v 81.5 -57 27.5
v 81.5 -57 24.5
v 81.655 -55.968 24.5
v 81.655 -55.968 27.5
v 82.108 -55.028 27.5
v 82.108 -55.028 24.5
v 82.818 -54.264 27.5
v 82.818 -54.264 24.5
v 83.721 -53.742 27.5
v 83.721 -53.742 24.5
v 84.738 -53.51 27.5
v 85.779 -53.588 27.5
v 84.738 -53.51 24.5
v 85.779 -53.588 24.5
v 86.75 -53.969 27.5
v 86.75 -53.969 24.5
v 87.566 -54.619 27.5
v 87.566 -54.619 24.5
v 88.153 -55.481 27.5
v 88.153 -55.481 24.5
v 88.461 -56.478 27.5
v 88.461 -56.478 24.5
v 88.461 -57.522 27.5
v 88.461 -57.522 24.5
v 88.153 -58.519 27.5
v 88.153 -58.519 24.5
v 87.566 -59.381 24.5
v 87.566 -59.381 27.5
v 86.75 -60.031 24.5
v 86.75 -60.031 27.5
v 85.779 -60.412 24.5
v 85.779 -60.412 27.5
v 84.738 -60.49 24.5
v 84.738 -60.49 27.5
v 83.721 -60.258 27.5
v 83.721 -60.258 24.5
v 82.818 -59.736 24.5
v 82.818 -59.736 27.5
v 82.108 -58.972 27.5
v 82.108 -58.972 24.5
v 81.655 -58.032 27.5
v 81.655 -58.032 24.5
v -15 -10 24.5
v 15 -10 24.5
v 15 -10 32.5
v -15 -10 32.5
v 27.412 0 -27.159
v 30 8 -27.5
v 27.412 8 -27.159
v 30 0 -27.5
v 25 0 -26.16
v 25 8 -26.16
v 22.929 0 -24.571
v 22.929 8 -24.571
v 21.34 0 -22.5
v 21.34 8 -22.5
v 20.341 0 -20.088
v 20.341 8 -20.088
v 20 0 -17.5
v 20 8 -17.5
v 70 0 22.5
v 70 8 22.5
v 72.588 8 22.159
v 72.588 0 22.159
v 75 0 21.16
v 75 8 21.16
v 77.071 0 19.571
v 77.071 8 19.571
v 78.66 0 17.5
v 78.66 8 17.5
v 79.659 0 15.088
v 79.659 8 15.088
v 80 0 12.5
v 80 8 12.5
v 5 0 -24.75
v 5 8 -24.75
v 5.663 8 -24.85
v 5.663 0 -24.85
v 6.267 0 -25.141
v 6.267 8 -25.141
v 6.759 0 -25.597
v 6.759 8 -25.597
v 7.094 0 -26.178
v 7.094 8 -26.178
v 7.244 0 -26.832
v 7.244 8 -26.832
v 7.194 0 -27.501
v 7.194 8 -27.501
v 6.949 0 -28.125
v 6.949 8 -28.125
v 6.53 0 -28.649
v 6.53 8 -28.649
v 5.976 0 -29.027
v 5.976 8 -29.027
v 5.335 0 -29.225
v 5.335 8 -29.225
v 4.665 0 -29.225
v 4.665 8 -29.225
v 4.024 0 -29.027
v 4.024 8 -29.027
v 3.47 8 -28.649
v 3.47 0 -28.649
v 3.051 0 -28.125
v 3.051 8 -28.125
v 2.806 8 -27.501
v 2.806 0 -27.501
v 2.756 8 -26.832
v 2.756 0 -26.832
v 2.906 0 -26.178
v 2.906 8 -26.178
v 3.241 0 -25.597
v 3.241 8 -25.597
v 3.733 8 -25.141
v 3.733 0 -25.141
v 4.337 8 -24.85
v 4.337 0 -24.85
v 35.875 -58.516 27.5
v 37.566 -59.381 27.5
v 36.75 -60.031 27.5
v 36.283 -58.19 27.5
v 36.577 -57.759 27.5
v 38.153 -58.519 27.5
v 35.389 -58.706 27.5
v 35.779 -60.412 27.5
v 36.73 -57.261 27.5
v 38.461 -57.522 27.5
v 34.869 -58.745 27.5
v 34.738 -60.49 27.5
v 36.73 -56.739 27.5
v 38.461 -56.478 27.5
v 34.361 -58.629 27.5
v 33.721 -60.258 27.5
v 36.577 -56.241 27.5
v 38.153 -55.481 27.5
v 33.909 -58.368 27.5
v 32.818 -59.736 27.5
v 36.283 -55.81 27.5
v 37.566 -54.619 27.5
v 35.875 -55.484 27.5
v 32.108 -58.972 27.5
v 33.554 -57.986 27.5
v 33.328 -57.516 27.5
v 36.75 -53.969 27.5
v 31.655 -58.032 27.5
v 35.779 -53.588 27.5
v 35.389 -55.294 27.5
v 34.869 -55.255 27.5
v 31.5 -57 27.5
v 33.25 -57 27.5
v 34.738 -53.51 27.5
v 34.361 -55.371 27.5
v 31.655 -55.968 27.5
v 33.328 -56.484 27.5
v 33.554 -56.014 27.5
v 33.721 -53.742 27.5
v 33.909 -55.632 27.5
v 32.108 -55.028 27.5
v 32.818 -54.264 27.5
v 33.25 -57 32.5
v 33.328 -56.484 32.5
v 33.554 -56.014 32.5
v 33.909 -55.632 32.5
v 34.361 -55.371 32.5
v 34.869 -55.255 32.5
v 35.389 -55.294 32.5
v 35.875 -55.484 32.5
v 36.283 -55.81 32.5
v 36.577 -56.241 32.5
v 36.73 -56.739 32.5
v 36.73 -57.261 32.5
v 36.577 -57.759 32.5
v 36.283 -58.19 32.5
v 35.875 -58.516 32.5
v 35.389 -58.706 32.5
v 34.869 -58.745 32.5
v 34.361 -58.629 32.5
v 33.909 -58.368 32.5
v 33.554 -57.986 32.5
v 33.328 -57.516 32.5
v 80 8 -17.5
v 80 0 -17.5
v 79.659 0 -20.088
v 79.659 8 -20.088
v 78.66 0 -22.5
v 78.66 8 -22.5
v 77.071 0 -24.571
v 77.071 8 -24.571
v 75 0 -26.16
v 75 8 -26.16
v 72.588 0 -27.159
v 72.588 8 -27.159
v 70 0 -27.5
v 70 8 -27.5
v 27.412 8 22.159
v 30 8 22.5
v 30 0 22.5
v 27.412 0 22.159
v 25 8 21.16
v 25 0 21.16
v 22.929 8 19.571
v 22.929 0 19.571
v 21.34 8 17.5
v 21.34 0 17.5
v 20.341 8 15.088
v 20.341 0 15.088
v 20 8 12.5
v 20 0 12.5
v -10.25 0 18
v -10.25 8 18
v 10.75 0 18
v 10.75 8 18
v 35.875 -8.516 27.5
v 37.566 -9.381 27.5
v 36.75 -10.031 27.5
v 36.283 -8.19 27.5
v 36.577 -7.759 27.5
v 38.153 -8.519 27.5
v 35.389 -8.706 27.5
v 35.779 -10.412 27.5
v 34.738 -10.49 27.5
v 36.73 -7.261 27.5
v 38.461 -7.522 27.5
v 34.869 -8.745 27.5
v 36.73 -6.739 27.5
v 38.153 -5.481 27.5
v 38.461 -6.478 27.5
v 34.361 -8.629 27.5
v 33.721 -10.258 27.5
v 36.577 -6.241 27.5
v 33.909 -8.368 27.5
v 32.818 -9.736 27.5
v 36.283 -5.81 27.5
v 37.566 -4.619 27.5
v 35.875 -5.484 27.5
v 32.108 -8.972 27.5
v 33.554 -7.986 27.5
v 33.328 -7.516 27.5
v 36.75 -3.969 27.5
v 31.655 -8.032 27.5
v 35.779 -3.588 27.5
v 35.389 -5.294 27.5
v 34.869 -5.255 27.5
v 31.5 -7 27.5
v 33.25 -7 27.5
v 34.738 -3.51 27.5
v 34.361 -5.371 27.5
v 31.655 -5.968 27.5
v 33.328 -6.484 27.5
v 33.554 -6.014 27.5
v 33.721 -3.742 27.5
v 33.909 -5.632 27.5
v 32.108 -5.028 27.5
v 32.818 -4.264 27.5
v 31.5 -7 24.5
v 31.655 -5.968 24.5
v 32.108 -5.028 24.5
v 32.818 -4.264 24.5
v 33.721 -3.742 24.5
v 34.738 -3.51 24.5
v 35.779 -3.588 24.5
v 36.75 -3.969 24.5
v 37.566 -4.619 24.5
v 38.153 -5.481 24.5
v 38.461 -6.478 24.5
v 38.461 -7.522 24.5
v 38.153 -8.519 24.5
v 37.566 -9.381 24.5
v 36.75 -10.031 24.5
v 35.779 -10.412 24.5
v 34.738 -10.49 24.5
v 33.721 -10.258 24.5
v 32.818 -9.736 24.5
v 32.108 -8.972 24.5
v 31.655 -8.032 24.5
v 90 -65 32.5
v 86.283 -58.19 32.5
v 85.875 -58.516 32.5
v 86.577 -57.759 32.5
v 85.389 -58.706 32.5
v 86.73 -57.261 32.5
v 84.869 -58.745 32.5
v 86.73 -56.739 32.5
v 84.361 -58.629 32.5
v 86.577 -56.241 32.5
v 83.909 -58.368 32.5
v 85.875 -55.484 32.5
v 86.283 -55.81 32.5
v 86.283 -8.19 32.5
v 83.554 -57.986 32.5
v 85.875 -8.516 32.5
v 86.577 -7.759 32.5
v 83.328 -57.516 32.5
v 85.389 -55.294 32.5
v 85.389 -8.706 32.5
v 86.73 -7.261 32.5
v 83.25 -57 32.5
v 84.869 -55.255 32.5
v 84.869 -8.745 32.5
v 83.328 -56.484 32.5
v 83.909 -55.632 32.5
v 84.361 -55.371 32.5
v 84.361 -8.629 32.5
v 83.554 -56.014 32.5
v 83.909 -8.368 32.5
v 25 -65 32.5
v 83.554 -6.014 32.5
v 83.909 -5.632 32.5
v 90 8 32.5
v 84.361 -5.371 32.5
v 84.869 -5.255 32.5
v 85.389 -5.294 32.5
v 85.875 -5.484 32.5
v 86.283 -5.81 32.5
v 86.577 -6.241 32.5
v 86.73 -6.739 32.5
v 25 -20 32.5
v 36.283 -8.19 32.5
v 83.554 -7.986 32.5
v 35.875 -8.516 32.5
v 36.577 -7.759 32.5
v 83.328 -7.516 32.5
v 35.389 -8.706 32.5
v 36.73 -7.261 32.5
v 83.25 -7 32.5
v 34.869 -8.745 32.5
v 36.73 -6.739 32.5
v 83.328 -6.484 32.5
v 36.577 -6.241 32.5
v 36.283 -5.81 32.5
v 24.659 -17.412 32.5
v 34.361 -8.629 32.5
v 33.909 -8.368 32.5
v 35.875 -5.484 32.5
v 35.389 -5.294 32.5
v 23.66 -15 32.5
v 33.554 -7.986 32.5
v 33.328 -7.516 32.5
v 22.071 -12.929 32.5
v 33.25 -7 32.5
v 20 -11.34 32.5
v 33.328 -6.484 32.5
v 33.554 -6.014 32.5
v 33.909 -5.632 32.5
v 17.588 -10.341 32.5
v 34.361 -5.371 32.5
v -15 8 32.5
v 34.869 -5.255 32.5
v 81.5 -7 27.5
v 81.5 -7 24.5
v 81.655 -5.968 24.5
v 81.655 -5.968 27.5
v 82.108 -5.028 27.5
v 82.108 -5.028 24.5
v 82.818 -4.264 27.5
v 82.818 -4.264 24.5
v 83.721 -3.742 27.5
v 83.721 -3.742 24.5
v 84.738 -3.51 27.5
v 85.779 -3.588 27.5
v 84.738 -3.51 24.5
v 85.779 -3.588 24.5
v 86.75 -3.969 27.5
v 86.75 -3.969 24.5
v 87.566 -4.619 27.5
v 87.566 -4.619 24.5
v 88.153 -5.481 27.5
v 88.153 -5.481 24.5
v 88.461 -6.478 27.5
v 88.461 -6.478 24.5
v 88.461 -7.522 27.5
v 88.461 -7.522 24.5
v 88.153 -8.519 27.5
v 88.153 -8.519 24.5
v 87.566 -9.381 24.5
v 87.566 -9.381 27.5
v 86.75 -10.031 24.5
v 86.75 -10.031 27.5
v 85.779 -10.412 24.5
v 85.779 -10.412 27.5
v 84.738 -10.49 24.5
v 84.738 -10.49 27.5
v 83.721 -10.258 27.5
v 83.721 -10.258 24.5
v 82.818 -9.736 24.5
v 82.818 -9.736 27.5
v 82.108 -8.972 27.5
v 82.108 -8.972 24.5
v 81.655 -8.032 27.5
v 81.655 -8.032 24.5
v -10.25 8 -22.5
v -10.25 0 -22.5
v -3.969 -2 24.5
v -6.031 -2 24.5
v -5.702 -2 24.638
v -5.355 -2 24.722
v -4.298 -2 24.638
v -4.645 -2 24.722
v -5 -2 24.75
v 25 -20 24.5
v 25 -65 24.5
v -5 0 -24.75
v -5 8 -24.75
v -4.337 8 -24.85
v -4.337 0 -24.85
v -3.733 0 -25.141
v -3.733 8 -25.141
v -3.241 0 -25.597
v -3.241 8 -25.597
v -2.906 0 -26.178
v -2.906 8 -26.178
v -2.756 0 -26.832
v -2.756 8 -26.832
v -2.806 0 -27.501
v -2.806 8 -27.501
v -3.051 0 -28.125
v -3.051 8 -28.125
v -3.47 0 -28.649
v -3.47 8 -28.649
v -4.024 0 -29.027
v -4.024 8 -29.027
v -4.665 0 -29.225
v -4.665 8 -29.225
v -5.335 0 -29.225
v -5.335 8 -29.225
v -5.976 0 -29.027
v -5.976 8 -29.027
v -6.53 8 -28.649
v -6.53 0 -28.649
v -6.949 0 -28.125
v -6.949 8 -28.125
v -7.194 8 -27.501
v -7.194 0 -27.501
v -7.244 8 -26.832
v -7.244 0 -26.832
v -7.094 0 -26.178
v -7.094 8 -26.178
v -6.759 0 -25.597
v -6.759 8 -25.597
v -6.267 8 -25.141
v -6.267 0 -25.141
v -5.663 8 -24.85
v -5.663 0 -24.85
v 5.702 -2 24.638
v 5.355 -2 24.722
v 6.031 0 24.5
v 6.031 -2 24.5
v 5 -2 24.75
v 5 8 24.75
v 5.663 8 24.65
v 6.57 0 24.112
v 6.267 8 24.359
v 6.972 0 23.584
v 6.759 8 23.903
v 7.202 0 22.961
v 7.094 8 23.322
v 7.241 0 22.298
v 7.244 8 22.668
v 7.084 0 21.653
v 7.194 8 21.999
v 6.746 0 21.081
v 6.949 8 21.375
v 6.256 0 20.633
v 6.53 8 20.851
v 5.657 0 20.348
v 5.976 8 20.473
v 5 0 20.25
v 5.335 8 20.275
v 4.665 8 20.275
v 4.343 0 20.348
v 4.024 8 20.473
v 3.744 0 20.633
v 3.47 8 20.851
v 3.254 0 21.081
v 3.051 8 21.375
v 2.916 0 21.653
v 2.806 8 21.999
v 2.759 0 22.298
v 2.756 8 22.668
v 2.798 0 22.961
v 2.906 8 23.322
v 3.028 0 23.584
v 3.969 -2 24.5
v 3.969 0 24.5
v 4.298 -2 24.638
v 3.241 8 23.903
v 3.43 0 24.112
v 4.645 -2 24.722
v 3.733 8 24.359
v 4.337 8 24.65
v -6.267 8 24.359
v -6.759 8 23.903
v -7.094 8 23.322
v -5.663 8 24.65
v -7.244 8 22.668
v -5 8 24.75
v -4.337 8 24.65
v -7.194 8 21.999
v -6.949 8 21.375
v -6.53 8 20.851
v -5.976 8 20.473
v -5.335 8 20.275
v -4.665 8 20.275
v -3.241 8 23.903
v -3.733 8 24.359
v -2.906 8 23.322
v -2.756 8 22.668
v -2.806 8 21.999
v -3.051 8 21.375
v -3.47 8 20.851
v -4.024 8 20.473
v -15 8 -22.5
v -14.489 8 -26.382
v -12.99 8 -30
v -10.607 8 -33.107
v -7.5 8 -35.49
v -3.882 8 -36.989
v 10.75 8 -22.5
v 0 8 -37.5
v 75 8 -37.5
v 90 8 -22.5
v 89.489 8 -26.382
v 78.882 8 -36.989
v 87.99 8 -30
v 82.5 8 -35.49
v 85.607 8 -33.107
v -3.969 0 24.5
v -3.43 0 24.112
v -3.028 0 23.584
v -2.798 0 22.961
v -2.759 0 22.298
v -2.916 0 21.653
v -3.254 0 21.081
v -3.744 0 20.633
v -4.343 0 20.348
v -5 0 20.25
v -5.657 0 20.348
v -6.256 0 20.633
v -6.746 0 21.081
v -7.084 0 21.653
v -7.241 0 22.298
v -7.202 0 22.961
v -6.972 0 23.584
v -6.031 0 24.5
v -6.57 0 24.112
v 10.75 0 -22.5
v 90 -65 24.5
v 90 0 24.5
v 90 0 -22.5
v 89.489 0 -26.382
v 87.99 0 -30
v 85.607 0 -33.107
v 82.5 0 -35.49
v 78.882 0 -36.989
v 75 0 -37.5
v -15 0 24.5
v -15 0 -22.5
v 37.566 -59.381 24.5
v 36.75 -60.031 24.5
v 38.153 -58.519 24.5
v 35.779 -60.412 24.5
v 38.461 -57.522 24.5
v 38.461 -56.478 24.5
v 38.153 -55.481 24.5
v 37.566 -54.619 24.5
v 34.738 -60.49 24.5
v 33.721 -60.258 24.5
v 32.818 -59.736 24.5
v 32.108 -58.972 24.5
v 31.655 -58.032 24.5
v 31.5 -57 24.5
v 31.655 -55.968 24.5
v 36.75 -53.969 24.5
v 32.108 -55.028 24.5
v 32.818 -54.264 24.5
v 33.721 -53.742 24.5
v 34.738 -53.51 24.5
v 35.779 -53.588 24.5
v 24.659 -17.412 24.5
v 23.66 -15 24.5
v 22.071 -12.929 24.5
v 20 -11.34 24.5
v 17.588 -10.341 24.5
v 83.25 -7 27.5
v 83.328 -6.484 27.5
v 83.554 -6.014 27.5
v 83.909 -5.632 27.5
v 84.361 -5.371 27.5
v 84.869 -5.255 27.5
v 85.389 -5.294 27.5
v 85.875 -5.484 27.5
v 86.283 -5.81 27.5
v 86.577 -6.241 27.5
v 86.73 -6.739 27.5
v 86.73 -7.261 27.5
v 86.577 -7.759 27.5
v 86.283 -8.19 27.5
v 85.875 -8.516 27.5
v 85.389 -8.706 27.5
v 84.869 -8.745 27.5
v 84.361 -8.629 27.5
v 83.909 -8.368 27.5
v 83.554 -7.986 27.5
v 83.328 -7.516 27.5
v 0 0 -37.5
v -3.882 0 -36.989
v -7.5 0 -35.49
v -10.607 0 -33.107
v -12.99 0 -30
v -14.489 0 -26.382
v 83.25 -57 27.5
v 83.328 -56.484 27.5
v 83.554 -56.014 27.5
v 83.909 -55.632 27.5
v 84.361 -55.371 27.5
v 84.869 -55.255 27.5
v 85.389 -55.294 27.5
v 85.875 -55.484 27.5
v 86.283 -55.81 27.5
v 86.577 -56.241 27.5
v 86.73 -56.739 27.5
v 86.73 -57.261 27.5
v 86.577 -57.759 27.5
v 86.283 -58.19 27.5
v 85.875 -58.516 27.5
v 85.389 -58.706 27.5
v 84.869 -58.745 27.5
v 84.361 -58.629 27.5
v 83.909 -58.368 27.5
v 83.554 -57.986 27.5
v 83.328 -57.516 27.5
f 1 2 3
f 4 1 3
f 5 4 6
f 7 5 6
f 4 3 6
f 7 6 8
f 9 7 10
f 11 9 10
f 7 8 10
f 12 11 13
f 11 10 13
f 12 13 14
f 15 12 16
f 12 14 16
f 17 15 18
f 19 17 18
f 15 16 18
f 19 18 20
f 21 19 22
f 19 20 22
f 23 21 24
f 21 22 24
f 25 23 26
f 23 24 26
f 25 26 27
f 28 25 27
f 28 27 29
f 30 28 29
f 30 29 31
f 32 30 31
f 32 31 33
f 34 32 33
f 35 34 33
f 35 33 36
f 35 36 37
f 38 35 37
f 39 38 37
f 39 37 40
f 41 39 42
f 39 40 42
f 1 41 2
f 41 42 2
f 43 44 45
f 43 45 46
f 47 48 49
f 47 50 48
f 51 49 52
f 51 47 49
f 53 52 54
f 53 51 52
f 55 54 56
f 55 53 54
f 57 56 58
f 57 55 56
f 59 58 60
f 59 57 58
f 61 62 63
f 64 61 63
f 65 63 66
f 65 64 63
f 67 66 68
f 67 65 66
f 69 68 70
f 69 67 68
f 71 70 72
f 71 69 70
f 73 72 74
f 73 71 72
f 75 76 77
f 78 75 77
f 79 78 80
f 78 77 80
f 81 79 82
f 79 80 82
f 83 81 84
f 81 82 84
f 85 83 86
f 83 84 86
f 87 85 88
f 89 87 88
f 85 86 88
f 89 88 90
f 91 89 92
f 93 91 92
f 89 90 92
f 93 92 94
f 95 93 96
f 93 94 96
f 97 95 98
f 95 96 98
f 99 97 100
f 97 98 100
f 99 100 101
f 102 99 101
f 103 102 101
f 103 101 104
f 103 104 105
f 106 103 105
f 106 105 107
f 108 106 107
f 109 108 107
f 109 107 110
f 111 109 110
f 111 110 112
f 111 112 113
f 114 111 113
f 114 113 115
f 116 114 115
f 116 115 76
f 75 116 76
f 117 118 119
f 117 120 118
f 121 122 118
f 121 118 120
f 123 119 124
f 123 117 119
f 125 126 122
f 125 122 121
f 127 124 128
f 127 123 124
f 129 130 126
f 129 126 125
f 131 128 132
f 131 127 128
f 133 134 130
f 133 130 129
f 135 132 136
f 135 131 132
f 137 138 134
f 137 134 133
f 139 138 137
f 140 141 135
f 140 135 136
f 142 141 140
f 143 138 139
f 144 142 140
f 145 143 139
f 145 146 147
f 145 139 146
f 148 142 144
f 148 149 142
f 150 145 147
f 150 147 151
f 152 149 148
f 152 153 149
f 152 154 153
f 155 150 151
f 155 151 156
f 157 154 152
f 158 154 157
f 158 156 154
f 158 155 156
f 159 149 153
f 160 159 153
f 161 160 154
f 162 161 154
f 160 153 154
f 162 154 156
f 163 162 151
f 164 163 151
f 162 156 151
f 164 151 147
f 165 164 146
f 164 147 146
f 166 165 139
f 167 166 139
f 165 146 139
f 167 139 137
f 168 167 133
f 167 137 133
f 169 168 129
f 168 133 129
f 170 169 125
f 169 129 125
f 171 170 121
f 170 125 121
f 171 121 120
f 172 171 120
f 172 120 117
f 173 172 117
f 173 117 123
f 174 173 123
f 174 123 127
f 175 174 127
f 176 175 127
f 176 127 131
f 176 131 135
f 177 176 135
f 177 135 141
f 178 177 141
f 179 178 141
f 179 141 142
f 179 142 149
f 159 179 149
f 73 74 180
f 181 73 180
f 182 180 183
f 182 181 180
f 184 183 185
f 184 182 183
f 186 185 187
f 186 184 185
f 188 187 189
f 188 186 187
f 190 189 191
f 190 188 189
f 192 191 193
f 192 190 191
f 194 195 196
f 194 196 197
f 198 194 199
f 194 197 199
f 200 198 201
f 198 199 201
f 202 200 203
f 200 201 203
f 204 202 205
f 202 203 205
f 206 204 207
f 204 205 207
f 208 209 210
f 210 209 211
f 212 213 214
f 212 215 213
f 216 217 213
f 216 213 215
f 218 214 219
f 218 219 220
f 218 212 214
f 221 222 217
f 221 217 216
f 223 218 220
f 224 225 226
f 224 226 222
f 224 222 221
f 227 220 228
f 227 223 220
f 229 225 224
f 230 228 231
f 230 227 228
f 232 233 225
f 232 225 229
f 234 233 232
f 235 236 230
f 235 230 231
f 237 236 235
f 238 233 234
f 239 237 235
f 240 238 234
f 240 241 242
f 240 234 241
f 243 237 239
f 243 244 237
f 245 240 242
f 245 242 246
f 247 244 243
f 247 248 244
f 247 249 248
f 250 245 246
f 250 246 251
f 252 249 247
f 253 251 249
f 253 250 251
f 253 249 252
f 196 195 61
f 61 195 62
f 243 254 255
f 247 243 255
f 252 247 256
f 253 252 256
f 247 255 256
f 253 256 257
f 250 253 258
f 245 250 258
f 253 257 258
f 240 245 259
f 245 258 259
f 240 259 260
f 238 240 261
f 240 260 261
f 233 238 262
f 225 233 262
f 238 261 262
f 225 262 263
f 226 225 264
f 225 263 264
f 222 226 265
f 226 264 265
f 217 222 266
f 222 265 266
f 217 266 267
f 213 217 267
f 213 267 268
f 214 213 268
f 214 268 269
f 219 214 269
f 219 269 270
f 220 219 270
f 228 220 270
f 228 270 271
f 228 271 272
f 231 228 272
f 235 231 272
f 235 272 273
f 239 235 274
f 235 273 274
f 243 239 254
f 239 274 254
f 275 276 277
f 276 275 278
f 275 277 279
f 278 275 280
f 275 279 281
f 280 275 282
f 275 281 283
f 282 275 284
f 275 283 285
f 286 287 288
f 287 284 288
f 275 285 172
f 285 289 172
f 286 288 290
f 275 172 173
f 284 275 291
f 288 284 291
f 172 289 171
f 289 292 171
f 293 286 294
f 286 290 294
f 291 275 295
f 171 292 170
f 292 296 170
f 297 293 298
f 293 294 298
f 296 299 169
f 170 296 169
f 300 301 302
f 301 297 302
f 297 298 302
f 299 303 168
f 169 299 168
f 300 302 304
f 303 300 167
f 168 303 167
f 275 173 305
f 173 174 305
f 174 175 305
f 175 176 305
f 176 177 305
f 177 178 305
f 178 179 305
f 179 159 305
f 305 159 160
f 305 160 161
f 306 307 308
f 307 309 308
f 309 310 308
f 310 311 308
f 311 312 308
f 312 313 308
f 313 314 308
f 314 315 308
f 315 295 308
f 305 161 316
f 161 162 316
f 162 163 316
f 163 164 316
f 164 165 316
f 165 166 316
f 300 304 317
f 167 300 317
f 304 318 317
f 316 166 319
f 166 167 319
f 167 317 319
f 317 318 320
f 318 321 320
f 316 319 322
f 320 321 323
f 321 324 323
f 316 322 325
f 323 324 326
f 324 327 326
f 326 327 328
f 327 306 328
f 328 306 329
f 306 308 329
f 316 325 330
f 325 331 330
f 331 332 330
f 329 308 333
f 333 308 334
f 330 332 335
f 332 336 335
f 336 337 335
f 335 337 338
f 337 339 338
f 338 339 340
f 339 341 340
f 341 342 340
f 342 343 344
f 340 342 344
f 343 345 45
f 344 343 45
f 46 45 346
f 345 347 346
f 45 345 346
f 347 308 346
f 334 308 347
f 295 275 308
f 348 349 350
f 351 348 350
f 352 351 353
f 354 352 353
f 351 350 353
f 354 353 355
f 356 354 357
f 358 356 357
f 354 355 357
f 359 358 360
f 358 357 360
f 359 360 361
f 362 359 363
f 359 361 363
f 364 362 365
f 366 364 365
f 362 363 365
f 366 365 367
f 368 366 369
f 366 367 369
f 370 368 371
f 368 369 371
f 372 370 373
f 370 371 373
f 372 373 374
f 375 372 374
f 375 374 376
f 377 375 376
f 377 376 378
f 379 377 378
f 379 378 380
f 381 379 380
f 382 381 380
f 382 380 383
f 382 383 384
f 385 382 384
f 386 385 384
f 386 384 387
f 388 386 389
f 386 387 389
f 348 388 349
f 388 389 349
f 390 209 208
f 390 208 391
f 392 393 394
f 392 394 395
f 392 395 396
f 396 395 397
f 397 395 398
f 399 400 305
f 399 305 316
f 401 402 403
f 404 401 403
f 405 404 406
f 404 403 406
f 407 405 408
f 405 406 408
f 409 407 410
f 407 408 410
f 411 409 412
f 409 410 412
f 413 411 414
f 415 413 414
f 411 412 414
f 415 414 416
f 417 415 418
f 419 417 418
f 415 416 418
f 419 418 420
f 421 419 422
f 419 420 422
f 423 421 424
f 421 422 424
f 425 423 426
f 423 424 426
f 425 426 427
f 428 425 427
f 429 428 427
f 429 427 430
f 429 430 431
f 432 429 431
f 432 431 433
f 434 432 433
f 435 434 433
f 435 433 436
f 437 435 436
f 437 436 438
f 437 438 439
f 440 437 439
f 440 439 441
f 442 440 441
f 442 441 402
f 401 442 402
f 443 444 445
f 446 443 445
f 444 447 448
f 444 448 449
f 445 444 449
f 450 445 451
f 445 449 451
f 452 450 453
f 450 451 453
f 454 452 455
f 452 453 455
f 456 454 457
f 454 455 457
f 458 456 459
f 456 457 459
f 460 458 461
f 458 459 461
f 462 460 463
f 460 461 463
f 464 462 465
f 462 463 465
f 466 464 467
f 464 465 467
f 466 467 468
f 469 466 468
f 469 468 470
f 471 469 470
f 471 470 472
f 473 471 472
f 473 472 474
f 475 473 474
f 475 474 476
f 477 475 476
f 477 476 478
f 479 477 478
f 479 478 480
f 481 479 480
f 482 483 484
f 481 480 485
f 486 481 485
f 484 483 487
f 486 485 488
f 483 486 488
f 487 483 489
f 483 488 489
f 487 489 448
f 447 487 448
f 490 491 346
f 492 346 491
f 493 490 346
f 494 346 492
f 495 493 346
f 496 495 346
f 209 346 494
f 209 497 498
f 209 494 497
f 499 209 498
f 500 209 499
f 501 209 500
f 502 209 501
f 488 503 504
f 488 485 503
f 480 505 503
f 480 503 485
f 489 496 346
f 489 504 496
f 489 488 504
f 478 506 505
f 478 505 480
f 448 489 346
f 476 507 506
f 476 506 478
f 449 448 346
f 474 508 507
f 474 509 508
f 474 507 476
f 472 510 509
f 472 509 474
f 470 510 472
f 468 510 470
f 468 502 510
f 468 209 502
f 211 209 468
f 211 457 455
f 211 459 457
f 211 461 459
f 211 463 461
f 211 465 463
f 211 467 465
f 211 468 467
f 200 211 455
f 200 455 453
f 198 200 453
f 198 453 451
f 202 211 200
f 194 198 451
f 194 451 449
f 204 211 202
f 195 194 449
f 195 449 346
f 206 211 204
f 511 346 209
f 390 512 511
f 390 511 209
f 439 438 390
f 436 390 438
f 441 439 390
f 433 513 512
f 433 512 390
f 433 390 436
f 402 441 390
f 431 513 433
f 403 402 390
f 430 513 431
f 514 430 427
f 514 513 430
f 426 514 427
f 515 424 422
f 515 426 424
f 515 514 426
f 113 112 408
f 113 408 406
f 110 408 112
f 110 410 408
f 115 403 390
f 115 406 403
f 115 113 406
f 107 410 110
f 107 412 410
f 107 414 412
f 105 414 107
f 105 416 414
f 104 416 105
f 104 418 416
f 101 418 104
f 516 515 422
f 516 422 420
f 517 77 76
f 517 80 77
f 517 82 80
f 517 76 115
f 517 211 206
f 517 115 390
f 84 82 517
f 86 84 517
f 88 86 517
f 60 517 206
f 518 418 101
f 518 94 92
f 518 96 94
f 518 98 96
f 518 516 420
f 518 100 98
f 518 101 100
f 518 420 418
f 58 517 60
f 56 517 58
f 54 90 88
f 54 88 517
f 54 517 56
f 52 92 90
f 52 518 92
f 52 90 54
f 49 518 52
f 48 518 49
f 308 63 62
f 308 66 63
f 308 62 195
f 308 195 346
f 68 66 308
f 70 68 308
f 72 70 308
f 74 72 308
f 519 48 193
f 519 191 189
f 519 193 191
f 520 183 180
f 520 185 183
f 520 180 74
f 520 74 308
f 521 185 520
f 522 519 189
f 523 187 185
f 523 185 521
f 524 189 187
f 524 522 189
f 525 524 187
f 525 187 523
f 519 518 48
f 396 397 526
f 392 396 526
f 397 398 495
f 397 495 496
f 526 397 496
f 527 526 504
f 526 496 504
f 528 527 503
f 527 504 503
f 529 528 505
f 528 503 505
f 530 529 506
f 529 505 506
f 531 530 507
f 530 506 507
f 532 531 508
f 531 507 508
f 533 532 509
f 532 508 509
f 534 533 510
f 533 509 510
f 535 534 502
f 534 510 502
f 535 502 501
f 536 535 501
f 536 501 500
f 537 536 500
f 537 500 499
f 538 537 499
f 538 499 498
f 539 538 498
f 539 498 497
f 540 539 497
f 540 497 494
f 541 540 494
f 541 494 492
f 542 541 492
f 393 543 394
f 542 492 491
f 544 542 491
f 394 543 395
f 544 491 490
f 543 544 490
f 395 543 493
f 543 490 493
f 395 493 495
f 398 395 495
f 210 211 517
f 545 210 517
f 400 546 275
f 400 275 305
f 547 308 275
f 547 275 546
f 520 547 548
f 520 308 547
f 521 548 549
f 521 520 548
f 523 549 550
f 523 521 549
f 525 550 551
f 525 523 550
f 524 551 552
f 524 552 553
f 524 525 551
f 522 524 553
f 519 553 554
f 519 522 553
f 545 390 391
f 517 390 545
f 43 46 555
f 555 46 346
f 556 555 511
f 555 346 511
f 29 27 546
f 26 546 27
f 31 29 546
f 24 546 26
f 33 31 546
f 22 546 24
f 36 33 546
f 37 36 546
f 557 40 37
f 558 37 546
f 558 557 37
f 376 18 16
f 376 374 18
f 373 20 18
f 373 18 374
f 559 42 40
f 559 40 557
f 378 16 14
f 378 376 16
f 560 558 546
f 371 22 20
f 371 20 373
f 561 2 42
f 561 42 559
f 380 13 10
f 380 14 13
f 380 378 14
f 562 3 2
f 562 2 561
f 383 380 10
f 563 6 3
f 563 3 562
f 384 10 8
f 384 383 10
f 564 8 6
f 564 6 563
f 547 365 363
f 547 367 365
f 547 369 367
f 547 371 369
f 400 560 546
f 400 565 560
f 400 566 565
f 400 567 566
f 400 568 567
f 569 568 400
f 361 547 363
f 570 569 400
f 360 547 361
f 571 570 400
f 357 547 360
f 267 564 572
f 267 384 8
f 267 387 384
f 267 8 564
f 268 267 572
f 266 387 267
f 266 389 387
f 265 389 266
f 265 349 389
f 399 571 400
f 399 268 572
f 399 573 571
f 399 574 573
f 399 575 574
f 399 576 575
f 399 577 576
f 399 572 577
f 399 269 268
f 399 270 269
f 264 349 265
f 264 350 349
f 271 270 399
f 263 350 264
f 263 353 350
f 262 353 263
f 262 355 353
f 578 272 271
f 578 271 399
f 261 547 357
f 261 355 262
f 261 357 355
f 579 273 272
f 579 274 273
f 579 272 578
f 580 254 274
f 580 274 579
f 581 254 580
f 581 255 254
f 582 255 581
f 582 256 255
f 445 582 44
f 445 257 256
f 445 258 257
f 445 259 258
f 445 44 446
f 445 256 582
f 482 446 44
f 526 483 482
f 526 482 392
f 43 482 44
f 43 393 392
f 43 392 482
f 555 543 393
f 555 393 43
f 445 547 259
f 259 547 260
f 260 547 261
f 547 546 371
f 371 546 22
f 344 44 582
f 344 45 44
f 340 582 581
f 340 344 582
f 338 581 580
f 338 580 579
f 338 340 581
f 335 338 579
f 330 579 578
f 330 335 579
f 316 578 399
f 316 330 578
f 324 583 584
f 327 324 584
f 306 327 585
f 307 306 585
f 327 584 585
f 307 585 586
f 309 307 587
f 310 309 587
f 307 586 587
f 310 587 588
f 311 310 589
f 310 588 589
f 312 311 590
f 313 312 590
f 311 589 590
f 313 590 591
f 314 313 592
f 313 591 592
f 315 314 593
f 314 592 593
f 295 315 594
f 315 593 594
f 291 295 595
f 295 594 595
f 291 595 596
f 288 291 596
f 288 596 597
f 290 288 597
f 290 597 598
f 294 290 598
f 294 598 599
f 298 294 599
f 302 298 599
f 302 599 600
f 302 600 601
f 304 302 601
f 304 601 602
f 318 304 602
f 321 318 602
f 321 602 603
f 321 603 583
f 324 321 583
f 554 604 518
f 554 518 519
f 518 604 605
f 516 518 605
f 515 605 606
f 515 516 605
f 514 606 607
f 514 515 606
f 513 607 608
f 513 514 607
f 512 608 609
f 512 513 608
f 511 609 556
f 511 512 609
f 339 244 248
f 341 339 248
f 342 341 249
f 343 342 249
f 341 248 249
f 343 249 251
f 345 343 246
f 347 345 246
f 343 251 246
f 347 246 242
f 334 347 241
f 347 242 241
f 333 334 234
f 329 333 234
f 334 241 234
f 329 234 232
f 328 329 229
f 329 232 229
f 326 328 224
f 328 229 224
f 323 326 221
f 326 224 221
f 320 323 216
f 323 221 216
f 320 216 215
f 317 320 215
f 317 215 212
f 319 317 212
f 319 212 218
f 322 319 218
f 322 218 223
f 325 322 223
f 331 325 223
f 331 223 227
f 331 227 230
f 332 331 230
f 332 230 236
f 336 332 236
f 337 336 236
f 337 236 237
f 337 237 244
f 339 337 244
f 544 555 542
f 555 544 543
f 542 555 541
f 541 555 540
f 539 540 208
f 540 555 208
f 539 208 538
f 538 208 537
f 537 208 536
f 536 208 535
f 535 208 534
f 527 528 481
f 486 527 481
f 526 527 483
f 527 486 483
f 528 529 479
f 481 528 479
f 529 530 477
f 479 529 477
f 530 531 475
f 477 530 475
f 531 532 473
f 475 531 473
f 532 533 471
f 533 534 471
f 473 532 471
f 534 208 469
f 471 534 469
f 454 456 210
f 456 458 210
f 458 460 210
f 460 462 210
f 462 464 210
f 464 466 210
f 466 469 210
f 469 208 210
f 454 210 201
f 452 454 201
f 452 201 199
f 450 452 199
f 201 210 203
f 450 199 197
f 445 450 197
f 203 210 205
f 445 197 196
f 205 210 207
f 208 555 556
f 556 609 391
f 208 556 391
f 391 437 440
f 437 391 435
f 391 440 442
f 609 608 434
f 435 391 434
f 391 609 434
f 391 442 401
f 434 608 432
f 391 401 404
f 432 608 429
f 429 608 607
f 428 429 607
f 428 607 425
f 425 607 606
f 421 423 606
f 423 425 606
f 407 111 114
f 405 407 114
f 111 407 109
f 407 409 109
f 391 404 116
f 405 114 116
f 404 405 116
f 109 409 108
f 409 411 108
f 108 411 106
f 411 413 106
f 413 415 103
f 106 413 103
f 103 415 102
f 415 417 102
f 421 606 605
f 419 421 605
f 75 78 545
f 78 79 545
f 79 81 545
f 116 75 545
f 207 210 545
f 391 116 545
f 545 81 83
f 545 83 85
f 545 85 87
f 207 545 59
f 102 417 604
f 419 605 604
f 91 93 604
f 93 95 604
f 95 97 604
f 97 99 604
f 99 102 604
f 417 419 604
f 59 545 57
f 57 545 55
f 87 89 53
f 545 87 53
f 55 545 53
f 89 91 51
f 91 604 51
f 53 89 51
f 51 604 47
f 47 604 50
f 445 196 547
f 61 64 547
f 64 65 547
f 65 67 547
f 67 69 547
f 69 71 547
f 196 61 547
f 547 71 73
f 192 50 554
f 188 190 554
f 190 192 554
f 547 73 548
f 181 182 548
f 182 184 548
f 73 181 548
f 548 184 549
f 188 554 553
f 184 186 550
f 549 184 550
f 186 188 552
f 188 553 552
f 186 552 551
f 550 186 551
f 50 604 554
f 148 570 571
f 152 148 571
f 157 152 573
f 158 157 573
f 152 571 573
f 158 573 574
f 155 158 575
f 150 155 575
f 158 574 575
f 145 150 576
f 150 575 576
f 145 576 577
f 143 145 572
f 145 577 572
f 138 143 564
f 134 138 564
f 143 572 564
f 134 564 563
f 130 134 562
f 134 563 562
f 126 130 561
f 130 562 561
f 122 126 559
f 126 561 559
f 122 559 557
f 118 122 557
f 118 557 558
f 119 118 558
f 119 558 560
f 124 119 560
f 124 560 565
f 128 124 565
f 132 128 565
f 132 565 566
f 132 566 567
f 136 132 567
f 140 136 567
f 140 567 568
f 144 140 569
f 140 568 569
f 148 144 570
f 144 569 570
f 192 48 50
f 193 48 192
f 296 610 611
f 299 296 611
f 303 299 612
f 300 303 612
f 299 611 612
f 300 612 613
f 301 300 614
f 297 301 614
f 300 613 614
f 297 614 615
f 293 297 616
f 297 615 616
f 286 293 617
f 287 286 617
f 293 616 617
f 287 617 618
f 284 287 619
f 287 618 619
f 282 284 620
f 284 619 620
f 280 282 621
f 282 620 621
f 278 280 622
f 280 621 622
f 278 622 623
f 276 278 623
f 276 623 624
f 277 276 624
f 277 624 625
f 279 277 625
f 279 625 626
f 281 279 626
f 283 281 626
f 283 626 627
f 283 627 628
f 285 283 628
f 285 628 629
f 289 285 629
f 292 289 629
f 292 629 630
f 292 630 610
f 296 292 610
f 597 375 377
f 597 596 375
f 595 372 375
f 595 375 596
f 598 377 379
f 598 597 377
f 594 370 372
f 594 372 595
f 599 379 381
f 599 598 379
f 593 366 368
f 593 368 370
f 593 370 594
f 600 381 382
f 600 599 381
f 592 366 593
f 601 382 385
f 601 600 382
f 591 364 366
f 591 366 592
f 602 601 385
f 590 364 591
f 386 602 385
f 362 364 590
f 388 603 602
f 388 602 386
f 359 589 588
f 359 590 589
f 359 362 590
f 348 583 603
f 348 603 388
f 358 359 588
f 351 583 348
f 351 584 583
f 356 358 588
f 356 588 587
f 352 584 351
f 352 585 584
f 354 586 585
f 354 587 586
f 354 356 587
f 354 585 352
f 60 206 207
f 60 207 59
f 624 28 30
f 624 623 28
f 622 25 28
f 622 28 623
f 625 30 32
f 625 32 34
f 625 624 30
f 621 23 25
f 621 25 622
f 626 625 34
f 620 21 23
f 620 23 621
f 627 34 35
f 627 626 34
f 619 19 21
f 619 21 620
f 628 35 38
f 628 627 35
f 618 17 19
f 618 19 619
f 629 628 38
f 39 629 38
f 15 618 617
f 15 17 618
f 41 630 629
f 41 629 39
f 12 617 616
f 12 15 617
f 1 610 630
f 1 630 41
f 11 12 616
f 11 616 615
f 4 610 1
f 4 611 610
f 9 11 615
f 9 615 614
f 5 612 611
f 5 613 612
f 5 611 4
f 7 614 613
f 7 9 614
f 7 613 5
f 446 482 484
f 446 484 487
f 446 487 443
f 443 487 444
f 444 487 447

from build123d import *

# Parameters (mm, degrees)
SKETCH2_W           = 105
SKETCH2_H           = 70
BOSS_EXTRUDE1_DEPTH = 8
SKETCH4_W           = 105
SKETCH4_H           = 8
BOSS_EXTRUDE2_DEPTH = 65
SKETCH6_R           = 1.75
CUT_EXTRUDE1_DEPTH  = 10
SKETCH7_R           = 3.5
CUT_EXTRUDE2_DEPTH  = 3
SKETCH9_W           = 21
SKETCH9_H           = 40.5
CUT_EXTRUDE3_DEPTH  = 10
SKETCH10_R          = 2.25
CUT_EXTRUDE4_DEPTH  = 10
FILLET1_R           = 15
FILLET2_R           = 15
SKETCH12_W          = 60
SKETCH12_H          = 50
CUT_EXTRUDE5_DEPTH  = 10
FILLET3_R           = 10
FILLET4_R           = 10
FILLET5_R           = 10
FILLET6_R           = 10
SKETCH13_W          = 40
SKETCH13_H          = 55
CUT_EXTRUDE6_DEPTH  = 10
FILLET7_R           = 10


with BuildPart() as part:
    # Sketch2 → Boss-Extrude1 (new body)
    with BuildSketch(Plane(origin=(0, 0, 0), x_dir=(1, 0, 0), z_dir=(0, 1, 0))):
        with Locations((37.5, 2.5)):
            Rectangle(SKETCH2_W, SKETCH2_H)
    extrude(amount=BOSS_EXTRUDE1_DEPTH)

    # Sketch4 → Boss-Extrude2 (add)
    with BuildSketch(Plane(origin=(0, 0, 0), x_dir=(-1, 0, 0), z_dir=(0, -1, 0))):
        with Locations((-37.5, -28.5)):
            Rectangle(SKETCH4_W, SKETCH4_H)
    extrude(amount=BOSS_EXTRUDE2_DEPTH)

    # Sketch6 → Cut-Extrude1 (cut)
    with BuildSketch(Plane(origin=(0, 0, 24.5), x_dir=(-1, 0, 0), z_dir=(0, 0, -1))):
        with Locations((-85, -7)):
            Circle(SKETCH6_R)
        with Locations((-35, -7)):
            Circle(SKETCH6_R)
        with Locations((-85, -57)):
            Circle(SKETCH6_R)
        with Locations((-35, -57)):
            Circle(SKETCH6_R)
    extrude(amount=-CUT_EXTRUDE1_DEPTH, mode=Mode.SUBTRACT)

    # Sketch7 → Cut-Extrude2 (cut)
    with BuildSketch(Plane(origin=(0, 0, 24.5), x_dir=(-1, 0, 0), z_dir=(0, 0, -1))):
        with Locations((-85, -7)):
            Circle(SKETCH7_R)
        with Locations((-35, -7)):
            Circle(SKETCH7_R)
        with Locations((-35, -57)):
            Circle(SKETCH7_R)
        with Locations((-85, -57)):
            Circle(SKETCH7_R)
    extrude(amount=-CUT_EXTRUDE2_DEPTH, mode=Mode.SUBTRACT)

    # Sketch9 → Cut-Extrude3 (cut)
    with BuildSketch(Plane(origin=(0, 8, 0), x_dir=(1, 0, 0), z_dir=(0, 1, 0))):
        with Locations((0.25, 2.25)):
            Rectangle(SKETCH9_W, SKETCH9_H)
    extrude(amount=-CUT_EXTRUDE3_DEPTH, mode=Mode.SUBTRACT)

    # Sketch10 → Cut-Extrude4 (cut)
    with BuildSketch(Plane(origin=(0, 8, 0), x_dir=(1, 0, 0), z_dir=(0, 1, 0))):
        with Locations(Location((-5, 27, 0), (0, 0, 270))):
            Circle(SKETCH10_R)
        with Locations(Location((5, 27, 0), (0, 0, 270))):
            Circle(SKETCH10_R)
        with Locations(Location((-5, -22.5, 0), (0, 0, 270))):
            Circle(SKETCH10_R)
        with Locations(Location((5, -22.5, 0), (0, 0, 270))):
            Circle(SKETCH10_R)
    extrude(amount=-CUT_EXTRUDE4_DEPTH, mode=Mode.SUBTRACT)

    # Fillet1
    fillet1_edges = [part.edges().sort_by_distance(p)[0] for p in [
        (90, 4, -37.5),
    ]]
    fillet(fillet1_edges, radius=FILLET1_R)

    # Fillet2
    fillet2_edges = [part.edges().sort_by_distance(p)[0] for p in [
        (-15, 4, -37.5),
    ]]
    fillet(fillet2_edges, radius=FILLET2_R)

    # Sketch12 → Cut-Extrude5 (cut)
    with BuildSketch(Plane(origin=(0, 8, 0), x_dir=(1, 0, 0), z_dir=(0, 1, 0))):
        with Locations((50, 2.5)):
            Rectangle(SKETCH12_W, SKETCH12_H)
    extrude(amount=-CUT_EXTRUDE5_DEPTH, mode=Mode.SUBTRACT)

    # Fillet3
    fillet3_edges = [part.edges().sort_by_distance(p)[0] for p in [
        (20, 4, 22.5),
    ]]
    fillet(fillet3_edges, radius=FILLET3_R)

    # Fillet4
    fillet4_edges = [part.edges().sort_by_distance(p)[0] for p in [
        (80, 4, 22.5),
    ]]
    fillet(fillet4_edges, radius=FILLET4_R)

    # Fillet5
    fillet5_edges = [part.edges().sort_by_distance(p)[0] for p in [
        (80, 4, -27.5),
    ]]
    fillet(fillet5_edges, radius=FILLET5_R)

    # Fillet6
    fillet6_edges = [part.edges().sort_by_distance(p)[0] for p in [
        (20, 4, -27.5),
    ]]
    fillet(fillet6_edges, radius=FILLET6_R)

    # Sketch13 → Cut-Extrude6 (cut)
    with BuildSketch(Plane(origin=(0, 0, 24.5), x_dir=(-1, 0, 0), z_dir=(0, 0, -1))):
        with Locations((-5, -37.5)):
            Rectangle(SKETCH13_W, SKETCH13_H)
    extrude(amount=-CUT_EXTRUDE6_DEPTH, mode=Mode.SUBTRACT)

    # Fillet7
    fillet7_edges = [part.edges().sort_by_distance(p)[0] for p in [
        (25, -10, 28.5),
    ]]
    fillet(fillet7_edges, radius=FILLET7_R)


solid = part.part
